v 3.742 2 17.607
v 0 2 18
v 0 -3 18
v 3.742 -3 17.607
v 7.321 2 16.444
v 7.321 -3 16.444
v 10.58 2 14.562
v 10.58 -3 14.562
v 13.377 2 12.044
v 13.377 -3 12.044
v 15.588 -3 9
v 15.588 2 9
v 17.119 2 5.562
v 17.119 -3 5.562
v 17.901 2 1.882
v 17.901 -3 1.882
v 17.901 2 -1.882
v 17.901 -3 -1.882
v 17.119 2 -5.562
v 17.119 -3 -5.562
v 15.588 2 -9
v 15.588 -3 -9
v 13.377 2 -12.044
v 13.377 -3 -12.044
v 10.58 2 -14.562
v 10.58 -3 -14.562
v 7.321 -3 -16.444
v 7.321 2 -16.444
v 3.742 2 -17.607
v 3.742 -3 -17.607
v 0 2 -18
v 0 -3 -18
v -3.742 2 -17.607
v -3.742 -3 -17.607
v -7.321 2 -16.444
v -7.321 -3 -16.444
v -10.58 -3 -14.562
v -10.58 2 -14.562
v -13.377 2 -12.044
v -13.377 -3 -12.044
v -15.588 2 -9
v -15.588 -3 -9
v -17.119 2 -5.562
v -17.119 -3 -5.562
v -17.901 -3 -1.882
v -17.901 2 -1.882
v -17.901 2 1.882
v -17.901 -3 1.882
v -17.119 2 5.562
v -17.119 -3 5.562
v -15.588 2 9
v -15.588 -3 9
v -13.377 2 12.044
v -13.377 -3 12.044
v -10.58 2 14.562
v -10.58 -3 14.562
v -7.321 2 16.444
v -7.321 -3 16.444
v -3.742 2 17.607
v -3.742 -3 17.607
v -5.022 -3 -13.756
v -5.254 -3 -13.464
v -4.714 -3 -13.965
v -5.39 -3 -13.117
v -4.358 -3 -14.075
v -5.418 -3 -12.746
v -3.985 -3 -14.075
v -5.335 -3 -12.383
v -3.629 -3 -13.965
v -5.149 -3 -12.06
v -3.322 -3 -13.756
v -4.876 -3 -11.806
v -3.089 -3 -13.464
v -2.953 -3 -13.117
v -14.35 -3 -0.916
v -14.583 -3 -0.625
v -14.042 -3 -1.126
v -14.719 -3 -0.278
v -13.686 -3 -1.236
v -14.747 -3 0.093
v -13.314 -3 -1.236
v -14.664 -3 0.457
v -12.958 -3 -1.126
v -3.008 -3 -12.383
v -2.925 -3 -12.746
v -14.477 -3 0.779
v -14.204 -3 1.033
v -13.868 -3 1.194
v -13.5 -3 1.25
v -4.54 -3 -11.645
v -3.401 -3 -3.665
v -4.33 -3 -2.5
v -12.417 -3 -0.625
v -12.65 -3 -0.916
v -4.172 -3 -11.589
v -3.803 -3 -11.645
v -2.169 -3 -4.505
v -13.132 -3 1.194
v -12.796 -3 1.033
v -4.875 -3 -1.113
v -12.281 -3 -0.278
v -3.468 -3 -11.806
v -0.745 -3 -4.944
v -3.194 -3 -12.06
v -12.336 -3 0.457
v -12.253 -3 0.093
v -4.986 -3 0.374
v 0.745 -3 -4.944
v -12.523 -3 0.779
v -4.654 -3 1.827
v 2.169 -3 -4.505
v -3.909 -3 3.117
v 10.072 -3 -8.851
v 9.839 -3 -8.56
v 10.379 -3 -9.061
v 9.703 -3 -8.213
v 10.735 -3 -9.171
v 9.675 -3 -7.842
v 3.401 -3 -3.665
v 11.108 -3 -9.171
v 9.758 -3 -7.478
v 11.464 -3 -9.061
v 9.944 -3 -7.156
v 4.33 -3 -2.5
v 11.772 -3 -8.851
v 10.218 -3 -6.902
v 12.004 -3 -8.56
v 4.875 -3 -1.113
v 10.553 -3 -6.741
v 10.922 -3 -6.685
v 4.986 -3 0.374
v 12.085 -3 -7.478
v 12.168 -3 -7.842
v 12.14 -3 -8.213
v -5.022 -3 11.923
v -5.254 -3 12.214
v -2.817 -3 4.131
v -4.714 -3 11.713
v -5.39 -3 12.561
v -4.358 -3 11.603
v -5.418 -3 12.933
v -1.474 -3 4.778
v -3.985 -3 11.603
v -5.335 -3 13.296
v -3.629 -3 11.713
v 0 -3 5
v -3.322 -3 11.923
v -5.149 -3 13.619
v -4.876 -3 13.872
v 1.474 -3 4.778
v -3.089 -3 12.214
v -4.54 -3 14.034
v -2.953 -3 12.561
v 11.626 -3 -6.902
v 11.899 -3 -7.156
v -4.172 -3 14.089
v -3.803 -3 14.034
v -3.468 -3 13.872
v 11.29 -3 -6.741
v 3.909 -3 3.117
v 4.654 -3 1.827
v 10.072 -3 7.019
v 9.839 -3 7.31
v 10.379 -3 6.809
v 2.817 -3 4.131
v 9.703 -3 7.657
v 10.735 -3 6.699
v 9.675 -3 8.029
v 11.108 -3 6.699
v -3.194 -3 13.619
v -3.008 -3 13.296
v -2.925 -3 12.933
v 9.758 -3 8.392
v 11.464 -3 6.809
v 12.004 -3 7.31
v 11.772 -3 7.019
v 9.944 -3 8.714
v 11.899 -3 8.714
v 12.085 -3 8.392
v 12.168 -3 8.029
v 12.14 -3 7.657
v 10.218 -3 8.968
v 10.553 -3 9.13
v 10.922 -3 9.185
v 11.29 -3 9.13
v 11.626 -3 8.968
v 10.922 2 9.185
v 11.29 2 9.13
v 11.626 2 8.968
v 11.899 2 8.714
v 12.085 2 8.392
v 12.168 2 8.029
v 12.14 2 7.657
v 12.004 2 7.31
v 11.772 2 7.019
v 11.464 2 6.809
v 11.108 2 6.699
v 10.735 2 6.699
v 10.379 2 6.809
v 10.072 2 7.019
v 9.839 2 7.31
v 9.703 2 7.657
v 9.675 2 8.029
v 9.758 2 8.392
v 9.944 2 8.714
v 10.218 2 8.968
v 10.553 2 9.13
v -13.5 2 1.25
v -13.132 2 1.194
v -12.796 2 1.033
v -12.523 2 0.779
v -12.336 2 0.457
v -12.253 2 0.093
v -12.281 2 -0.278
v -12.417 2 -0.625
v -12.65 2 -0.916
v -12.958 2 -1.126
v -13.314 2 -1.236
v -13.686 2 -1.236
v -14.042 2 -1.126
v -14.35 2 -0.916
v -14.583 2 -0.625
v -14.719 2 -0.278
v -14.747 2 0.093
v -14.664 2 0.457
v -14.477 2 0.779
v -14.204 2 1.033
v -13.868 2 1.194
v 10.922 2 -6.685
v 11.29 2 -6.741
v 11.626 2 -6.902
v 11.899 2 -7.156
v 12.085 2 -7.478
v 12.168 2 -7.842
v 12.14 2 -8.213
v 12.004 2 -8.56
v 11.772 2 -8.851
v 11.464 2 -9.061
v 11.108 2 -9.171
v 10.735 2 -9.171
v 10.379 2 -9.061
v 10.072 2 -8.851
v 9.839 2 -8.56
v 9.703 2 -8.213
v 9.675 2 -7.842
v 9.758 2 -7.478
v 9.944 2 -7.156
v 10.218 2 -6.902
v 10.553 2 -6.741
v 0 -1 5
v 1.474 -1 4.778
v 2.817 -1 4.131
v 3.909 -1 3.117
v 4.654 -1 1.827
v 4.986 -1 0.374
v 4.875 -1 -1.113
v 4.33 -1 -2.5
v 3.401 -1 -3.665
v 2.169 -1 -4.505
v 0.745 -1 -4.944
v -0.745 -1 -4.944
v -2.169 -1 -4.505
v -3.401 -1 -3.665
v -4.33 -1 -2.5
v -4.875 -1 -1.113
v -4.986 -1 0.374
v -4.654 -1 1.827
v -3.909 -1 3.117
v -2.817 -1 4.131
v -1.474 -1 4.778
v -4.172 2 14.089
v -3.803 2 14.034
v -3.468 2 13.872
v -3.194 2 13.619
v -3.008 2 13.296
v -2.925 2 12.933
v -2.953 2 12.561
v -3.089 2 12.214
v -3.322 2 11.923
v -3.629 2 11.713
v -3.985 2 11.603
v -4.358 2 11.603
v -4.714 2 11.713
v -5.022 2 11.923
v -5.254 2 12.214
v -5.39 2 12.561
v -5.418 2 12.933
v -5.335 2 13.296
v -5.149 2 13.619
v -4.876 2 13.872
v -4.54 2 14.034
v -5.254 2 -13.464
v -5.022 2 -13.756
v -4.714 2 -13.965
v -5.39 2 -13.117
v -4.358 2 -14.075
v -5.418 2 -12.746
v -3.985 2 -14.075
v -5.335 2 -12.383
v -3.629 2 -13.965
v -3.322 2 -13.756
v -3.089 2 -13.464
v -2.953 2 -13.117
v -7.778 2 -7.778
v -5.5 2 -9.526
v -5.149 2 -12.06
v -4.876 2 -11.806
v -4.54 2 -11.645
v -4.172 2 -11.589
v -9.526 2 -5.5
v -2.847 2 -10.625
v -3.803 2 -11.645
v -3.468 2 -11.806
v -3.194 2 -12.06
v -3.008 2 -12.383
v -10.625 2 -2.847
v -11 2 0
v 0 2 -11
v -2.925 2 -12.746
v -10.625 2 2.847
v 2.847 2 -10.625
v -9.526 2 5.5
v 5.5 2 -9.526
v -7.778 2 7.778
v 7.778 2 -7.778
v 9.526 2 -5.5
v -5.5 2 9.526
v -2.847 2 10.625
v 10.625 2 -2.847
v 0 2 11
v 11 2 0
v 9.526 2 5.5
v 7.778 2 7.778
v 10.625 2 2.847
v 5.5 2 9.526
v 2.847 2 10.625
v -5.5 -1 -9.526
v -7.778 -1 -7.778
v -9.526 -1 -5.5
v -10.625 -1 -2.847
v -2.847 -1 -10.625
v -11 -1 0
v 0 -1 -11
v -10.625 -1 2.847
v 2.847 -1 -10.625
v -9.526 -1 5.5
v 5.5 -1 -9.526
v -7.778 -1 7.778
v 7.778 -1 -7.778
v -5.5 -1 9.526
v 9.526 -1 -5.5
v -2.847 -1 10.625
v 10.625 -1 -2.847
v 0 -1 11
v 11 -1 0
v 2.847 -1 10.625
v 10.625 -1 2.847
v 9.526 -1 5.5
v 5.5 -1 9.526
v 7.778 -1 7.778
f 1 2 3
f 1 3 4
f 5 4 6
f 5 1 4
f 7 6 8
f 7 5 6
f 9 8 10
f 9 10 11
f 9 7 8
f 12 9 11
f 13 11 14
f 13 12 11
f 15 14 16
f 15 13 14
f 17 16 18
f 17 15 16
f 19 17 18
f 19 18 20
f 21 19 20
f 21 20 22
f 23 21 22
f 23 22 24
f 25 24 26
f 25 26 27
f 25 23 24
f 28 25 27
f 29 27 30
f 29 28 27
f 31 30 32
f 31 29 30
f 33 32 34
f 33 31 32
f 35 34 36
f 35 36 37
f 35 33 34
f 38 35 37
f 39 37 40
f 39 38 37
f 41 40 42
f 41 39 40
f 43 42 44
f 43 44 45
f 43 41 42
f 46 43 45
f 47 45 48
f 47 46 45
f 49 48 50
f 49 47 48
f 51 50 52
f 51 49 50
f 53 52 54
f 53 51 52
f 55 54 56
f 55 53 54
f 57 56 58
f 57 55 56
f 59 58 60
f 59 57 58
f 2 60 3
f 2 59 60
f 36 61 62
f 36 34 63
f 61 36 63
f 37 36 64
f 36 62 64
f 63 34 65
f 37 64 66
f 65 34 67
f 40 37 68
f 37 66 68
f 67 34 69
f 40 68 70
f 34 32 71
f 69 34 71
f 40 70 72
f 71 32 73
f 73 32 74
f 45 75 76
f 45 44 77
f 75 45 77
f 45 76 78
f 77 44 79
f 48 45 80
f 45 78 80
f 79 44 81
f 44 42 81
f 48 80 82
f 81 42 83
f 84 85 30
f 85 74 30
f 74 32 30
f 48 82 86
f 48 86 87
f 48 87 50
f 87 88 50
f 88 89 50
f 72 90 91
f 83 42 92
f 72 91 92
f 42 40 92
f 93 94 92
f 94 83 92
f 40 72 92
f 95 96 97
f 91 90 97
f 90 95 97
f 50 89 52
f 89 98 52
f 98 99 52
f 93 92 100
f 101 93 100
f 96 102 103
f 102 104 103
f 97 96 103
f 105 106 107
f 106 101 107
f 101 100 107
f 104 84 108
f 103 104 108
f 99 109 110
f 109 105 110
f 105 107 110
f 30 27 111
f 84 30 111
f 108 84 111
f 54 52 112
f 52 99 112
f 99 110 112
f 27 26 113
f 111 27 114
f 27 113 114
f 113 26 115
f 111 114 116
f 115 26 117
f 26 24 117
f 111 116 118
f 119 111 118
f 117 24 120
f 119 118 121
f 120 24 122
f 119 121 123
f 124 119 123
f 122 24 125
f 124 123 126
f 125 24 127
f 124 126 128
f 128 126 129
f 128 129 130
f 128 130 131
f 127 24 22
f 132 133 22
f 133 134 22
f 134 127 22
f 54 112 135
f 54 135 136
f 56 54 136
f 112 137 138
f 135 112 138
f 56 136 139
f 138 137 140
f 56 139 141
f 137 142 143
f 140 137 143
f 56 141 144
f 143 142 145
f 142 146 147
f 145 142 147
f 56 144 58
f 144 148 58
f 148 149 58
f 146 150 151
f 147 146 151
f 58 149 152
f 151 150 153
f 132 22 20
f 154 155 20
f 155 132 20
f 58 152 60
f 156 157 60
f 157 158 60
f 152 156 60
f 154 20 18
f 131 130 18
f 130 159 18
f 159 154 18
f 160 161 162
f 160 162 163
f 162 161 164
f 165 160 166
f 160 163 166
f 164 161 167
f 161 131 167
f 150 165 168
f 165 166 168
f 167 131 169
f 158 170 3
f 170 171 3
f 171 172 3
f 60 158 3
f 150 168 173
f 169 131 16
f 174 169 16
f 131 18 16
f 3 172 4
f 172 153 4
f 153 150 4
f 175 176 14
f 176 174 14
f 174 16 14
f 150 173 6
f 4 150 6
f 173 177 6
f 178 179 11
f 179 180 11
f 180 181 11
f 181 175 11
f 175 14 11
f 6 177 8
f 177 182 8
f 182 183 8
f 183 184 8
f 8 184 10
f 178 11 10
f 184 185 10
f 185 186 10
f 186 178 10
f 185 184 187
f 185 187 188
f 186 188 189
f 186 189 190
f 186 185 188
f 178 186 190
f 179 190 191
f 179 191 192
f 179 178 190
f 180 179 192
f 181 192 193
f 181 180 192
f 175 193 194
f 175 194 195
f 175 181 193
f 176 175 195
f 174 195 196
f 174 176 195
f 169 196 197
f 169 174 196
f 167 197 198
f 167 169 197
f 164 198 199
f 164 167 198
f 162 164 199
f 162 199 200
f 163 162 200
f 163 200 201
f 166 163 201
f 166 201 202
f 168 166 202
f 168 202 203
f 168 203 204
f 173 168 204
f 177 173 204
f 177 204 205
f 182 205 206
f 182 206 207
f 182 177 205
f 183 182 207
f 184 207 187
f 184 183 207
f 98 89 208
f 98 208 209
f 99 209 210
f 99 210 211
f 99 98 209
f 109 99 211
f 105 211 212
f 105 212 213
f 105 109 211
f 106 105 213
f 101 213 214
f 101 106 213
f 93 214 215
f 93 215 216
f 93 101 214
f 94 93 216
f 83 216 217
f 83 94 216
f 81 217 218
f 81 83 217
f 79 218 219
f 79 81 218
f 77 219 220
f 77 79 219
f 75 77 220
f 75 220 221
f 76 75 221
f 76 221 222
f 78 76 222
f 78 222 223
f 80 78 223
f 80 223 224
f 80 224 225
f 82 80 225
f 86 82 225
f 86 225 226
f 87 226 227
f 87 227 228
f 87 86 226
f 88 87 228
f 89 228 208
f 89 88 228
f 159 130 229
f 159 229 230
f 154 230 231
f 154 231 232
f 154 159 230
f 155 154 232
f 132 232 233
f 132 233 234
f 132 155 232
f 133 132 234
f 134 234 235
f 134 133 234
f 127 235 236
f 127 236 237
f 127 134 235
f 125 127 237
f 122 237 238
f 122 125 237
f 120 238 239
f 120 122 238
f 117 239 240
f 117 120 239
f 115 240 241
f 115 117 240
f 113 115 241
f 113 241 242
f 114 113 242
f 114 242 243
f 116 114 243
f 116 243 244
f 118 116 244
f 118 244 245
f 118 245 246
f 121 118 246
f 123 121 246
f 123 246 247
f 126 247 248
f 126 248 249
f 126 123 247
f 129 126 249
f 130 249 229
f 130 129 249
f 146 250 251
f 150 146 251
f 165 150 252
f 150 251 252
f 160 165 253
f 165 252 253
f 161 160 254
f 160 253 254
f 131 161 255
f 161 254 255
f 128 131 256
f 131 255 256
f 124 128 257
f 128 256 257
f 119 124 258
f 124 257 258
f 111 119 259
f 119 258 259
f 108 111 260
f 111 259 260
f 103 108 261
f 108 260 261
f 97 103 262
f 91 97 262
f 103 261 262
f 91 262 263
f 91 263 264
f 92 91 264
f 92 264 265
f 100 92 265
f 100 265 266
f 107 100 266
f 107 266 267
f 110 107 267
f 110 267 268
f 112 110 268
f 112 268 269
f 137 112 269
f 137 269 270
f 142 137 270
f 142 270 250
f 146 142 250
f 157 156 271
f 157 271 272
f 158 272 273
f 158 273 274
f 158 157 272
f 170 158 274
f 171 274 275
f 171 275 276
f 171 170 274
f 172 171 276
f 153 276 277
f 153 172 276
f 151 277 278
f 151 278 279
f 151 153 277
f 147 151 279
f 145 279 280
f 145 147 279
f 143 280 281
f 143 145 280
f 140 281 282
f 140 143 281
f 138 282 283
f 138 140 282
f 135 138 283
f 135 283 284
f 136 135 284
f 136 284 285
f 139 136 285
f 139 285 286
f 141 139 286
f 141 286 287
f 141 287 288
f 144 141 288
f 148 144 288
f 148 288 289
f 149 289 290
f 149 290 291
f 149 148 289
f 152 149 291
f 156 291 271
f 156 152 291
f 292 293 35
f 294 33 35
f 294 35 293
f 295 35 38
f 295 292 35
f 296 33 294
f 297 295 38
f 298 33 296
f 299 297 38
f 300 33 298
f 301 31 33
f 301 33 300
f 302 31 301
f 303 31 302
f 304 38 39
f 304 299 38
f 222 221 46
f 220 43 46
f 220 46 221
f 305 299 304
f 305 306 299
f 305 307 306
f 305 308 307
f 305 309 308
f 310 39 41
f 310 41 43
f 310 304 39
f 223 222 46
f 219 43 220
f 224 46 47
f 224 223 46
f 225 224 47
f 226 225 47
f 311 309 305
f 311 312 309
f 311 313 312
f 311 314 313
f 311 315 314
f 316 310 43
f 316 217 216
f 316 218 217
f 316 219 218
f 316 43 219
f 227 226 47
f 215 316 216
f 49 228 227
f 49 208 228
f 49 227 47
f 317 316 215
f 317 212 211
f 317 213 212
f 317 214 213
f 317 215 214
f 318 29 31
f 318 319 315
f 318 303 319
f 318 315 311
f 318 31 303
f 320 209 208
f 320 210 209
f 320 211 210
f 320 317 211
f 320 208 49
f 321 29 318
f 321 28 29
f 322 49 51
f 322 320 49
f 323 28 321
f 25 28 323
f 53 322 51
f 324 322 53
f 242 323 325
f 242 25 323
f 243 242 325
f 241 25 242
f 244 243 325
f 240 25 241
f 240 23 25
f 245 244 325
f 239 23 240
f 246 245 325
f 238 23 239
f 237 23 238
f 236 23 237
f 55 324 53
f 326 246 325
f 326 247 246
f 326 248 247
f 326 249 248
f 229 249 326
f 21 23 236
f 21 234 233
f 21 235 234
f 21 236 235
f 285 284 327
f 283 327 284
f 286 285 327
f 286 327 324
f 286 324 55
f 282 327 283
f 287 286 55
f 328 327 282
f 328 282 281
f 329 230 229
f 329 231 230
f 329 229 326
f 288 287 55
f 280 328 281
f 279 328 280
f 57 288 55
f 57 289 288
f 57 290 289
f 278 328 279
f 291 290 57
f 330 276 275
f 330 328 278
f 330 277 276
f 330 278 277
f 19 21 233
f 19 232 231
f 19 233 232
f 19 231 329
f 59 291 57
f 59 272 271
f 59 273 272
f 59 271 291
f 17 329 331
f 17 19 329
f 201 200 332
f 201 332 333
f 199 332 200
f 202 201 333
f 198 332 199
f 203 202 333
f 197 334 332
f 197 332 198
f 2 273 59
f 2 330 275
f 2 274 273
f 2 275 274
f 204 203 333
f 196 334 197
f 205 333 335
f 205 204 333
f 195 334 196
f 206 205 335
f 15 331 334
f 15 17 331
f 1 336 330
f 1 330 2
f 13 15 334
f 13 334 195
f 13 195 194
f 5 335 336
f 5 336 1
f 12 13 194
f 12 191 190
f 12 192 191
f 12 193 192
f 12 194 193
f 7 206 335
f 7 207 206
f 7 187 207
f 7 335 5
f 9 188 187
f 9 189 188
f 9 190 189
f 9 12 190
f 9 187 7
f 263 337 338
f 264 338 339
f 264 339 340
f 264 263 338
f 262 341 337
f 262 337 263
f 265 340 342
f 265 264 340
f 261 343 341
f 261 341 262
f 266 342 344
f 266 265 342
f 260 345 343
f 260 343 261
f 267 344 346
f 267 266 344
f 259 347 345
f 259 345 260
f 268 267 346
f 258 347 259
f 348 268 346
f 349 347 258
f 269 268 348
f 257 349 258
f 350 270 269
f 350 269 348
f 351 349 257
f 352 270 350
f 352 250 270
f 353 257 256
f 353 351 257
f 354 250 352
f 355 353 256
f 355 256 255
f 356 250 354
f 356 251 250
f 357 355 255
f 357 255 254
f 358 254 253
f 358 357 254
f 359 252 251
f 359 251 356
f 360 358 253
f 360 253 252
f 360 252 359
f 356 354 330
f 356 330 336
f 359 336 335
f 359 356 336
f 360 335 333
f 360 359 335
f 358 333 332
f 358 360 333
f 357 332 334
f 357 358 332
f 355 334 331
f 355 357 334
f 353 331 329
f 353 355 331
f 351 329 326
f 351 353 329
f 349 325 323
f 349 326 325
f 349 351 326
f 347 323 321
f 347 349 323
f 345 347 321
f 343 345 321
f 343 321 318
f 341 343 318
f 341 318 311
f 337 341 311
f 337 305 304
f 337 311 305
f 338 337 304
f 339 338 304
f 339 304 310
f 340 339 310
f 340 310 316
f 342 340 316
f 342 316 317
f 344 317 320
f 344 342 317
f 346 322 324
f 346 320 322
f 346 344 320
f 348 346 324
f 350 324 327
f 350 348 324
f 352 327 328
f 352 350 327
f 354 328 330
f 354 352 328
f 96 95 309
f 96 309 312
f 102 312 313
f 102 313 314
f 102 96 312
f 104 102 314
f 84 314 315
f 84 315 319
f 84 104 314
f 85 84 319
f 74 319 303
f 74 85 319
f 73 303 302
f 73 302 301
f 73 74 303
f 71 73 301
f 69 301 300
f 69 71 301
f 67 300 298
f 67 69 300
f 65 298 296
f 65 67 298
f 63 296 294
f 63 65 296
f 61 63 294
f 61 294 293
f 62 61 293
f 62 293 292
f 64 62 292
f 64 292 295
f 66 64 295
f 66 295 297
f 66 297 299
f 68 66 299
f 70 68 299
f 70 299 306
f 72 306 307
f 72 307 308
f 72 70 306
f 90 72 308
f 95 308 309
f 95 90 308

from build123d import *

# Parameters (mm, degrees)
BOSS_EXTRUDE1_DEPTH      = 2
BOSS_EXTRUDE1_DEPTH_BACK = 3
SKETCH1_R                = 16
SKETCH1_R_2              = 1.75
SKETCH1_R_3              = 1.25
SKETCH2_R                = 4.95
SKETCH2_R_2              = 2.95
BOSS_EXTRUDE3_DEPTH      = 3
SKETCH5_R                = 3.5
CUT_EXTRUDE2_DEPTH       = 4
SKETCH6_R                = 18
SKETCH6_R_2              = 16
BOSS_EXTRUDE4_DEPTH      = 5
CUT_EXTRUDE3_DEPTH       = 10
CUT_EXTRUDE3_DEPTH_BACK  = 3
SKETCH7_R                = 11
SKETCH8_R                = 5
CUT_EXTRUDE4_DEPTH       = 3


with BuildPart() as part:
    # Sketch1 → Boss-Extrude1 (new, two sides: drawn at the far end of the back side and taken through both)
    with BuildSketch(Plane(origin=(0, 0, 0), x_dir=(1, 0, 0), z_dir=(0, 1, 0)).offset(-BOSS_EXTRUDE1_DEPTH_BACK)):
        with Locations(Location((0, 0, 0), (0, 0, 270))):
            Circle(SKETCH1_R)
        with Locations(Location((0, 0, 0), (0, 0, 270))):
            Circle(SKETCH1_R_2, mode=Mode.SUBTRACT)
        with Locations(Location((-13.5, 0, 0), (0, 0, 270))):
            Circle(SKETCH1_R_3, mode=Mode.SUBTRACT)
        with Locations(Location((-4.171729424, 12.83926297, 0), (0, 0, 270))):
            Circle(SKETCH1_R_3, mode=Mode.SUBTRACT)
        with Locations(Location((10.921729424, 7.935100906, 0), (0, 0, 270))):
            Circle(SKETCH1_R_3, mode=Mode.SUBTRACT)
        with Locations(Location((10.921729424, -7.935100906, 0), (0, 0, 270))):
            Circle(SKETCH1_R_3, mode=Mode.SUBTRACT)
        with Locations(Location((-4.171729424, -12.83926297, 0), (0, 0, 270))):
            Circle(SKETCH1_R_3, mode=Mode.SUBTRACT)
    extrude(amount=BOSS_EXTRUDE1_DEPTH + BOSS_EXTRUDE1_DEPTH_BACK)

    # Sketch2 → Boss-Extrude3 (add)
    with BuildSketch(Plane(origin=(0, 2, 0), x_dir=(1, 0, 0), z_dir=(0, 1, 0))):
        with Locations(Location((0, 0, 0), (0, 0, 270))):
            Circle(SKETCH2_R)
        with Locations(Location((0, 0, 0), (0, 0, 270))):
            Circle(SKETCH2_R_2, mode=Mode.SUBTRACT)
    extrude(amount=BOSS_EXTRUDE3_DEPTH)

    # Sketch5 → Cut-Extrude2 (cut)
    with BuildSketch(Plane.XZ.offset(3)):
        with Locations(Location((0, 0, 0), (0, 0, 270))):
            Circle(SKETCH5_R)
    extrude(amount=-CUT_EXTRUDE2_DEPTH, mode=Mode.SUBTRACT)

    # Sketch6 → Boss-Extrude4 (add)
    with BuildSketch(Plane(origin=(0, 2, 0), x_dir=(1, 0, 0), z_dir=(0, 1, 0))):
        with Locations(Location((0, 0, 0), (0, 0, 270))):
            Circle(SKETCH6_R)
        Circle(SKETCH6_R_2, mode=Mode.SUBTRACT)
    extrude(amount=-BOSS_EXTRUDE4_DEPTH)

    # Sketch7 → Cut-Extrude3 (cut, two sides: drawn at the far end of the back side and taken through both)
    with BuildSketch(Plane(origin=(0, 2, 0), x_dir=(1, 0, 0), z_dir=(0, 1, 0)).offset(-CUT_EXTRUDE3_DEPTH_BACK)):
        with Locations(Location((0, 0, 0), (0, 0, 270))):
            Circle(SKETCH7_R)
    extrude(amount=CUT_EXTRUDE3_DEPTH + CUT_EXTRUDE3_DEPTH_BACK, mode=Mode.SUBTRACT)

    # Sketch8 → Cut-Extrude4 (cut)
    with BuildSketch(Plane(origin=(0, -1, 0), x_dir=(1, 0, 0), z_dir=(0, 1, 0))):
        with Locations(Location((0, 0, 0), (0, 0, 270))):
            Circle(SKETCH8_R)
    extrude(amount=-CUT_EXTRUDE4_DEPTH, mode=Mode.SUBTRACT)


solid = part.part
